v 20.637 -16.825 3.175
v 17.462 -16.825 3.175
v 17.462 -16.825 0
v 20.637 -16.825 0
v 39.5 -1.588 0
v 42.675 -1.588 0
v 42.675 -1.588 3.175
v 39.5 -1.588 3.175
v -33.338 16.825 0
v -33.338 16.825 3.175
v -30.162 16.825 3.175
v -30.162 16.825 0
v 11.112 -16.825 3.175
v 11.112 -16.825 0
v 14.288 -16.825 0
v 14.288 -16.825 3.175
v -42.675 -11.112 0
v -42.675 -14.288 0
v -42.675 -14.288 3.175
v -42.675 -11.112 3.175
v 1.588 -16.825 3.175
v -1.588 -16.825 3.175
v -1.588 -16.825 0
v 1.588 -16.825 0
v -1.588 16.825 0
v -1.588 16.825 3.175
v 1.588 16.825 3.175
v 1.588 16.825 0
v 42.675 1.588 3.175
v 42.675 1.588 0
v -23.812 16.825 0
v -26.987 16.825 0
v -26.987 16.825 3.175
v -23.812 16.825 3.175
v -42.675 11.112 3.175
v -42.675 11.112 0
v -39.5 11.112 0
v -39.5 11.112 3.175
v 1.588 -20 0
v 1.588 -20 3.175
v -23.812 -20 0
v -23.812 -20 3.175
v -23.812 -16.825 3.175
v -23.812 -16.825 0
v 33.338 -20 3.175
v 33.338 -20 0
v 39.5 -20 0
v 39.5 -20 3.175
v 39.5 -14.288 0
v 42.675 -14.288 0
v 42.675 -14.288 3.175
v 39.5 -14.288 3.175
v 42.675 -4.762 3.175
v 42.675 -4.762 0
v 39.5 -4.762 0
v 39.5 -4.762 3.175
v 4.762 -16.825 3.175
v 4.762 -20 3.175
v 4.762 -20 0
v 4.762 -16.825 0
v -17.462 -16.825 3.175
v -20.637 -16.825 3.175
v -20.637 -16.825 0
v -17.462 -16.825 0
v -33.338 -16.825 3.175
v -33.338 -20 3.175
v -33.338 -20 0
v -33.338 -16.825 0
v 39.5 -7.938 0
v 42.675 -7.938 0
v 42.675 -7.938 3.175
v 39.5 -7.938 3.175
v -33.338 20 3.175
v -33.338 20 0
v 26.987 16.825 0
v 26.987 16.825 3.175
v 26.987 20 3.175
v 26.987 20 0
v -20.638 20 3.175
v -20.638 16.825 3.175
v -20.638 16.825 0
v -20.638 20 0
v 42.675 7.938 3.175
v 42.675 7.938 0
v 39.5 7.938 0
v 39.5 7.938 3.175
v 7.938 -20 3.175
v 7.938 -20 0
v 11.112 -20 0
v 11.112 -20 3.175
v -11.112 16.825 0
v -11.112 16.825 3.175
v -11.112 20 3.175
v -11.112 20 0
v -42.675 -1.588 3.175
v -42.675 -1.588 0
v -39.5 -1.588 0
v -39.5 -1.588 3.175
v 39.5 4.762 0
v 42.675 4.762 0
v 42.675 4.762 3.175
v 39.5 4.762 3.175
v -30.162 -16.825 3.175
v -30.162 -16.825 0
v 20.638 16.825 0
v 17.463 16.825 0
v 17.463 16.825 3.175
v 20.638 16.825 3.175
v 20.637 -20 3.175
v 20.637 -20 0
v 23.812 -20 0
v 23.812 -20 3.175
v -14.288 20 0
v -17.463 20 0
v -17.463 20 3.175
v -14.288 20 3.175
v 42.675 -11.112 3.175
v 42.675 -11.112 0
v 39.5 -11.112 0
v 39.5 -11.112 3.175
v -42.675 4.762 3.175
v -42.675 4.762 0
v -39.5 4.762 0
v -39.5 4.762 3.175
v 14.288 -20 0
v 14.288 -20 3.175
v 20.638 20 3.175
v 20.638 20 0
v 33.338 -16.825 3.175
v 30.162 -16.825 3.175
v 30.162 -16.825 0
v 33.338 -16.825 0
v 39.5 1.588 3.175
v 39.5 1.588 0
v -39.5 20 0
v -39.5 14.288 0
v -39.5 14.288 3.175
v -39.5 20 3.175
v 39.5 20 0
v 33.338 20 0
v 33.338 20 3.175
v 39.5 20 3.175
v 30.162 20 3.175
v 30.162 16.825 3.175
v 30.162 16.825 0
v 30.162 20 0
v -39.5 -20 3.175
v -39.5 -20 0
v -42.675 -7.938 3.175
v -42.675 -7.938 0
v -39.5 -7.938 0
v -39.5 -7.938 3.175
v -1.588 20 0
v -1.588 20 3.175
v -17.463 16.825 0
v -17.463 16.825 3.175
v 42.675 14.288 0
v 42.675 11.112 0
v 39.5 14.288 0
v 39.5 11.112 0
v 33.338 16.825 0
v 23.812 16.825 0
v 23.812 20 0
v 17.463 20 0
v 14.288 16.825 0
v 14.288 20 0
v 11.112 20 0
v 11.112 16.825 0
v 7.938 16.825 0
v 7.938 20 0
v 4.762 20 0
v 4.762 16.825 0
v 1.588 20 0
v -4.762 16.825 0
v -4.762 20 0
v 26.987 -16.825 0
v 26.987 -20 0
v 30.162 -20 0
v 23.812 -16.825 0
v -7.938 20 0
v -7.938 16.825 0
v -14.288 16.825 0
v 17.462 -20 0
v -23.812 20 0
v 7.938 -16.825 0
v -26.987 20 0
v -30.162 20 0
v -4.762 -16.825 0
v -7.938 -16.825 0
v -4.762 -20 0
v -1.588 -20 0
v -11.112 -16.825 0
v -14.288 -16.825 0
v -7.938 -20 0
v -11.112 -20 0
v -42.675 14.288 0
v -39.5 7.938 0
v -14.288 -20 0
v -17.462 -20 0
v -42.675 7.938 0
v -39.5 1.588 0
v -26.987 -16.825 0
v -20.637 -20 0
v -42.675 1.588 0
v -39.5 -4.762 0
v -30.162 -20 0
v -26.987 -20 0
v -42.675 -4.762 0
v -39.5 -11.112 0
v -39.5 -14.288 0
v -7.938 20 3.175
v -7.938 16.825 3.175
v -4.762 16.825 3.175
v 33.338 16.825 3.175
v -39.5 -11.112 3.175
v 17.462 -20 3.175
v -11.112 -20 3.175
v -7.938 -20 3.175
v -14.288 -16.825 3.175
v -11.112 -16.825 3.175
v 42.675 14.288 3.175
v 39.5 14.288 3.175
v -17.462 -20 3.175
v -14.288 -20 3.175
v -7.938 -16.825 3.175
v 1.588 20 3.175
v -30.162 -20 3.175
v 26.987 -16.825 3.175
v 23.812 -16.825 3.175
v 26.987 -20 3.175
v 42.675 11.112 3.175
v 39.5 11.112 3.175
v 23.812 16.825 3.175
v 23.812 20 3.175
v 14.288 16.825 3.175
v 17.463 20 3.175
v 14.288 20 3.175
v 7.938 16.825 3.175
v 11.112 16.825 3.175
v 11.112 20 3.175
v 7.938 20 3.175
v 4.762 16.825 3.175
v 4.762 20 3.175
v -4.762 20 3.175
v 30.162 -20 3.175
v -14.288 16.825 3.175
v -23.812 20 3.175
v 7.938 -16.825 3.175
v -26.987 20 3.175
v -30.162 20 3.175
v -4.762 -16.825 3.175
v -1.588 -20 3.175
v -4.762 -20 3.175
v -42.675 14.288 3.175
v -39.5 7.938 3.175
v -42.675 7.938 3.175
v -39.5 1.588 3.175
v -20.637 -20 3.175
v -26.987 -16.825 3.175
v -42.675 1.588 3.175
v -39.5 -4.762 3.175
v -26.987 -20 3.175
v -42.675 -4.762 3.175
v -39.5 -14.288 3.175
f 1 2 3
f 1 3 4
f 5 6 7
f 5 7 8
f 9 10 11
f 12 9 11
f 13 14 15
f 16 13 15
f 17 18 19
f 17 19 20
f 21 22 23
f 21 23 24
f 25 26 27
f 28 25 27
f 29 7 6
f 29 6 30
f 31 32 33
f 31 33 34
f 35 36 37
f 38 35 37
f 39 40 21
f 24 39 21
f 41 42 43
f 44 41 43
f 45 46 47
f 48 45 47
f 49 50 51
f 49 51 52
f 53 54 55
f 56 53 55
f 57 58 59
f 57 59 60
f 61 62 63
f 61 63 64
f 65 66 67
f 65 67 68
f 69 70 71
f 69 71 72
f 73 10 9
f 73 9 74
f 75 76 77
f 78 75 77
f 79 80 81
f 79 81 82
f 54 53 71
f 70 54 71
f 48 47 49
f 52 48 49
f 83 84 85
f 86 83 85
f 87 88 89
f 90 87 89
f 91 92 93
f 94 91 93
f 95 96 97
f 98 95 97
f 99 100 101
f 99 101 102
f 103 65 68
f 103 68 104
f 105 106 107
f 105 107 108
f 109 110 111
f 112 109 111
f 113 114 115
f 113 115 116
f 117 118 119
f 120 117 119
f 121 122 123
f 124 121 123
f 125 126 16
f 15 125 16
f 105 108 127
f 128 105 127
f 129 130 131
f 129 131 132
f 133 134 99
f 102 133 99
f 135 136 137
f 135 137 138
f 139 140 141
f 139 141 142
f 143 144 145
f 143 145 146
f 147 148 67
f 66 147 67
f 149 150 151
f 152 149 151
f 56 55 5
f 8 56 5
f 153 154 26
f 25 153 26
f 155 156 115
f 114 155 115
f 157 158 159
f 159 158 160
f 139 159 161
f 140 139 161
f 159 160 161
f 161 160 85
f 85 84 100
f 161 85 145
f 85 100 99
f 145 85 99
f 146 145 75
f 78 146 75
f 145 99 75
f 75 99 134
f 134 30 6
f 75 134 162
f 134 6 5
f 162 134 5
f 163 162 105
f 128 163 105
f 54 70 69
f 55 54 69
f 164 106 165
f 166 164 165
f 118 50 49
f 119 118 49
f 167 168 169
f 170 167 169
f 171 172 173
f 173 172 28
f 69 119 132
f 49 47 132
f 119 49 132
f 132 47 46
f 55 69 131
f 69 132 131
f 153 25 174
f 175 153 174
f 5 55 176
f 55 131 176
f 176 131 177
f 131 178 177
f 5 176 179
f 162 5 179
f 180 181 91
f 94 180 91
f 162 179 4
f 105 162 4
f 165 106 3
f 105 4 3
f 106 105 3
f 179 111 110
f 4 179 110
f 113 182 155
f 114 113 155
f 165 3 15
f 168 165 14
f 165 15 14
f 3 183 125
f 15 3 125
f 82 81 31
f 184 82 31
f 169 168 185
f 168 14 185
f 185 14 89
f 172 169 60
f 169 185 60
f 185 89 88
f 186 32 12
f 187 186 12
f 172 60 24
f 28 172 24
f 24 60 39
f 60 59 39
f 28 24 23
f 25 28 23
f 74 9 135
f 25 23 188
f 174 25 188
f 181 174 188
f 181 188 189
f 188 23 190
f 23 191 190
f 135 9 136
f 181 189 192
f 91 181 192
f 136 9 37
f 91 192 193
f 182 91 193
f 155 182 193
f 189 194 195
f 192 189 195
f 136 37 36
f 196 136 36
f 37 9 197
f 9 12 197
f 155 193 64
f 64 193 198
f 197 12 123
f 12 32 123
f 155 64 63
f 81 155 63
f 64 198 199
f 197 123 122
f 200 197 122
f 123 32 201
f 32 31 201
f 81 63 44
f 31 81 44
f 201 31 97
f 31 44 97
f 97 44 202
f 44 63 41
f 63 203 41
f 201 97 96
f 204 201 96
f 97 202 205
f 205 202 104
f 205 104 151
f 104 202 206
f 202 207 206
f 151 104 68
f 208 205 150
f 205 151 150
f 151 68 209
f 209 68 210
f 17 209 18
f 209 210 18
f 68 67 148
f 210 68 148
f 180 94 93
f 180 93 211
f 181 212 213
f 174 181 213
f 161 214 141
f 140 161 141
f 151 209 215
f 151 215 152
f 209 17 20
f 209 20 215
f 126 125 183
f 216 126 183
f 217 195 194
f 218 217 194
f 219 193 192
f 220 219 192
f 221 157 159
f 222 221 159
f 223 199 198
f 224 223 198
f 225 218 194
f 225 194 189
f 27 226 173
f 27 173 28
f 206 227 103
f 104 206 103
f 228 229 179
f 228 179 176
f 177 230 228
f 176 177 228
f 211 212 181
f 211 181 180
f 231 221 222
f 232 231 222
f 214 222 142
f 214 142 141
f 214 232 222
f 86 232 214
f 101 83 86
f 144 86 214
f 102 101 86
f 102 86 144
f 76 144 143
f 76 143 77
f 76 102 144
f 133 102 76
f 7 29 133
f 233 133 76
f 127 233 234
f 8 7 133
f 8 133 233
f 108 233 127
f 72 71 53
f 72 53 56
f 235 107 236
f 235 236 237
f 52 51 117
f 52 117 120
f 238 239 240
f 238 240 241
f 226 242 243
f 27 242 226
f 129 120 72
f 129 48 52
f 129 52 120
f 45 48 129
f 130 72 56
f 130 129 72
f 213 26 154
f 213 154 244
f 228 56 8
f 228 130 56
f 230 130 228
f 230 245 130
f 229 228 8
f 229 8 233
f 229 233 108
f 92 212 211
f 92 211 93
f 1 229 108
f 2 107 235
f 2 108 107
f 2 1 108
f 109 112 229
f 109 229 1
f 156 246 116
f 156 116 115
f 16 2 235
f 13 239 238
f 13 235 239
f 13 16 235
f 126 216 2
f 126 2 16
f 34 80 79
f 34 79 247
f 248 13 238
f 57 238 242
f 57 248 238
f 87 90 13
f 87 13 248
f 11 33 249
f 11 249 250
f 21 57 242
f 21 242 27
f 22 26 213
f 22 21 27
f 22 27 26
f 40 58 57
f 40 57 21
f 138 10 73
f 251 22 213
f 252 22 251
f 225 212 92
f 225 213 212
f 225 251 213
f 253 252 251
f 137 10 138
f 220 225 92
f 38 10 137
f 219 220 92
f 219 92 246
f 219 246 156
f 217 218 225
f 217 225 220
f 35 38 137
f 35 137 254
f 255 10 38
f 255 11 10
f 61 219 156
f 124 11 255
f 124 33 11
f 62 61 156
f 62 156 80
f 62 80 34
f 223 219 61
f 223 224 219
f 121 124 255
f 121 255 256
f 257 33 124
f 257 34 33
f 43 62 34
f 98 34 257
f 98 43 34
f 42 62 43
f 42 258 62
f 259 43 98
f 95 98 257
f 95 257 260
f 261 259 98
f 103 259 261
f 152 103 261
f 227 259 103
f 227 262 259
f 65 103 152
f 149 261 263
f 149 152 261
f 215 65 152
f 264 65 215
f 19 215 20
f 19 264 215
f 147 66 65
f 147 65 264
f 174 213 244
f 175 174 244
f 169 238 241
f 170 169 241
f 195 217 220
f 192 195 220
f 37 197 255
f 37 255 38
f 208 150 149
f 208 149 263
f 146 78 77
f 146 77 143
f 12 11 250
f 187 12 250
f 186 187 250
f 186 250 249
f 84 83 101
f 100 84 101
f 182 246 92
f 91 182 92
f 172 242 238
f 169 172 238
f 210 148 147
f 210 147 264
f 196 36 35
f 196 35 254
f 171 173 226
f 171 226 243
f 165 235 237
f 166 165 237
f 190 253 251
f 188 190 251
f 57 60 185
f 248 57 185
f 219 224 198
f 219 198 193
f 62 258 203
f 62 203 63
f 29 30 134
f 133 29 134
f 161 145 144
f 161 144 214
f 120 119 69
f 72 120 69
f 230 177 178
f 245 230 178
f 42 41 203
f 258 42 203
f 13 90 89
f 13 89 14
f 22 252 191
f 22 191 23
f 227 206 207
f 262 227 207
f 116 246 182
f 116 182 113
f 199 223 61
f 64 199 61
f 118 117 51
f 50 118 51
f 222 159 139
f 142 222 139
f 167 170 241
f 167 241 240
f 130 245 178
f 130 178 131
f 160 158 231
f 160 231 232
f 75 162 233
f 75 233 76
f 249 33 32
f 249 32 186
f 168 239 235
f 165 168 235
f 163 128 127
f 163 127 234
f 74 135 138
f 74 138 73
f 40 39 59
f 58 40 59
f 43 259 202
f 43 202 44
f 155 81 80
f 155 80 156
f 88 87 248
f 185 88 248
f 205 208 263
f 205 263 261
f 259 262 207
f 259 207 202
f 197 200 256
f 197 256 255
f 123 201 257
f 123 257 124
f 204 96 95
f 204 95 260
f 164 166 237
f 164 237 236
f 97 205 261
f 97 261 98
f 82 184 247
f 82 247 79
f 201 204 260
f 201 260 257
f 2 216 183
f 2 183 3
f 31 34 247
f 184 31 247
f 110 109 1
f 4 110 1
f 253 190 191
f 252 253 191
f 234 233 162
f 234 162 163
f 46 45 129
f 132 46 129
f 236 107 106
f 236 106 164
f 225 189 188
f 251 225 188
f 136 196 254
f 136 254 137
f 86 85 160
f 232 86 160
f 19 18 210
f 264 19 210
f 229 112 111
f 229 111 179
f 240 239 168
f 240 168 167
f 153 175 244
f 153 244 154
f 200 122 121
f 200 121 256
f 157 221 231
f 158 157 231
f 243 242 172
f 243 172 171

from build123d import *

# Parameters (mm, degrees)
SKETCH1_W                     = 79
SKETCH1_H                     = 40
BOSS_EXTRUDE1_DEPTH           = 3.175
SKETCH2_W                     = 3.175
SKETCH2_H                     = 6.35
CUT_EXTRUDE1_DEPTH            = 10
LPATTERN1_COUNT               = 6
LPATTERN1_PITCH               = 6.35
LPATTERN1_COPY_1_SKETCH_W     = 3.175
LPATTERN1_COPY_1_SKETCH_H     = 6.35
LPATTERN1_COPY_1_DEPTH        = 10
LPATTERN1_COPY_2_SKETCH_W     = 3.175
LPATTERN1_COPY_2_SKETCH_H     = 6.35
LPATTERN1_COPY_2_DEPTH        = 10
LPATTERN1_COPY_3_SKETCH_W     = 3.175
LPATTERN1_COPY_3_SKETCH_H     = 6.35
LPATTERN1_COPY_3_DEPTH        = 10
LPATTERN1_COPY_4_SKETCH_W     = 3.175
LPATTERN1_COPY_4_SKETCH_H     = 6.35
LPATTERN1_COPY_4_DEPTH        = 10
LPATTERN1_COPY_5_SKETCH_W     = 3.175
LPATTERN1_COPY_5_SKETCH_H     = 6.35
LPATTERN1_COPY_5_DEPTH        = 10
LPATTERN1_COL_COUNT           = 6
LPATTERN1_COL_PITCH           = 6.35
LPATTERN1_COL_COPY_1_SKETCH_W = 3.175
LPATTERN1_COL_COPY_1_SKETCH_H = 6.35
LPATTERN1_COL_COPY_1_DEPTH    = 10
LPATTERN1_COL_COPY_2_SKETCH_W = 3.175
LPATTERN1_COL_COPY_2_SKETCH_H = 6.35
LPATTERN1_COL_COPY_2_DEPTH    = 10
LPATTERN1_COL_COPY_3_SKETCH_W = 3.175
LPATTERN1_COL_COPY_3_SKETCH_H = 6.35
LPATTERN1_COL_COPY_3_DEPTH    = 10
LPATTERN1_COL_COPY_4_SKETCH_W = 3.175
LPATTERN1_COL_COPY_4_SKETCH_H = 6.35
LPATTERN1_COL_COPY_4_DEPTH    = 10
LPATTERN1_COL_COPY_5_SKETCH_W = 3.175
LPATTERN1_COL_COPY_5_SKETCH_H = 6.35
LPATTERN1_COL_COPY_5_DEPTH    = 10
SKETCH3_W                     = 6.35
SKETCH3_H                     = 3.175
BOSS_EXTRUDE2_DEPTH           = 3.175
LPATTERN2_COUNT               = 3
LPATTERN2_PITCH               = 6.35
LPATTERN2_COL_COUNT           = 3
LPATTERN2_COL_PITCH           = 6.35
MIRROR2_COPY_1_SKETCH_W       = 6.35
MIRROR2_COPY_1_SKETCH_H       = 3.175
MIRROR2_COPY_1_DEPTH          = 3.175
MIRROR2_COPY_2_SKETCH_W       = 6.35
MIRROR2_COPY_2_SKETCH_H       = 3.175
MIRROR2_COPY_2_DEPTH          = 3.175
MIRROR2_COPY_3_SKETCH_W       = 6.35
MIRROR2_COPY_3_SKETCH_H       = 3.175
MIRROR2_COPY_3_DEPTH          = 3.175
MIRROR2_COPY_4_SKETCH_W       = 6.35
MIRROR2_COPY_4_SKETCH_H       = 3.175
MIRROR2_COPY_4_DEPTH          = 3.175


with BuildPart() as part:
    # Sketch1 → Boss-Extrude1 (new body)
    with BuildSketch(Plane.XY):
        Rectangle(SKETCH1_W, SKETCH1_H)
    extrude(amount=BOSS_EXTRUDE1_DEPTH)

    # Sketch2 → Cut-Extrude1 (cut)
    with BuildSketch(Plane.XY.offset(3.175)):
        with Locations((0, -20)):
            Rectangle(SKETCH2_W, SKETCH2_H)
    cut_extrude1 = extrude(amount=-CUT_EXTRUDE1_DEPTH, mode=Mode.SUBTRACT)

    # Mirror1: Cut-Extrude1 across plane
    add(cut_extrude1.mirror(Plane.ZX), mode=Mode.SUBTRACT)

    # LPattern1: Cut-Extrude1 ×6
    with Locations(*[(i * LPATTERN1_PITCH, 0, 0) for i in range(1, LPATTERN1_COUNT)]):
        add(cut_extrude1, mode=Mode.SUBTRACT)

    # LPattern1 copy 1 sketch → LPattern1 copy 1 (cut)
    with BuildSketch(Plane(origin=(6.35, 0, 3.175), x_dir=(1, 0, 0), z_dir=(0, 0, 1))):
        with Locations((0, 20)):
            Rectangle(LPATTERN1_COPY_1_SKETCH_W, LPATTERN1_COPY_1_SKETCH_H)
    extrude(amount=-LPATTERN1_COPY_1_DEPTH, mode=Mode.SUBTRACT)

    # LPattern1 copy 2 sketch → LPattern1 copy 2 (cut)
    with BuildSketch(Plane(origin=(12.7, 0, 3.175), x_dir=(1, 0, 0), z_dir=(0, 0, 1))):
        with Locations((0, 20)):
            Rectangle(LPATTERN1_COPY_2_SKETCH_W, LPATTERN1_COPY_2_SKETCH_H)
    extrude(amount=-LPATTERN1_COPY_2_DEPTH, mode=Mode.SUBTRACT)

    # LPattern1 copy 3 sketch → LPattern1 copy 3 (cut)
    with BuildSketch(Plane(origin=(19.05, 0, 3.175), x_dir=(1, 0, 0), z_dir=(0, 0, 1))):
        with Locations((0, 20)):
            Rectangle(LPATTERN1_COPY_3_SKETCH_W, LPATTERN1_COPY_3_SKETCH_H)
    extrude(amount=-LPATTERN1_COPY_3_DEPTH, mode=Mode.SUBTRACT)

    # LPattern1 copy 4 sketch → LPattern1 copy 4 (cut)
    with BuildSketch(Plane(origin=(25.4, 0, 3.175), x_dir=(1, 0, 0), z_dir=(0, 0, 1))):
        with Locations((0, 20)):
            Rectangle(LPATTERN1_COPY_4_SKETCH_W, LPATTERN1_COPY_4_SKETCH_H)
    extrude(amount=-LPATTERN1_COPY_4_DEPTH, mode=Mode.SUBTRACT)

    # LPattern1 copy 5 sketch → LPattern1 copy 5 (cut)
    with BuildSketch(Plane(origin=(31.75, 0, 3.175), x_dir=(1, 0, 0), z_dir=(0, 0, 1))):
        with Locations((0, 20)):
            Rectangle(LPATTERN1_COPY_5_SKETCH_W, LPATTERN1_COPY_5_SKETCH_H)
    extrude(amount=-LPATTERN1_COPY_5_DEPTH, mode=Mode.SUBTRACT)

    # LPattern1 col: Cut-Extrude1 ×6
    with Locations(*[(-i * LPATTERN1_COL_PITCH, 0, 0) for i in range(1, LPATTERN1_COL_COUNT)]):
        add(cut_extrude1, mode=Mode.SUBTRACT)

    # LPattern1 col copy 1 sketch → LPattern1 col copy 1 (cut)
    with BuildSketch(Plane(origin=(-6.35, 0, 3.175), x_dir=(1, 0, 0), z_dir=(0, 0, 1))):
        with Locations((0, 20)):
            Rectangle(LPATTERN1_COL_COPY_1_SKETCH_W, LPATTERN1_COL_COPY_1_SKETCH_H)
    extrude(amount=-LPATTERN1_COL_COPY_1_DEPTH, mode=Mode.SUBTRACT)

    # LPattern1 col copy 2 sketch → LPattern1 col copy 2 (cut)
    with BuildSketch(Plane(origin=(-12.7, 0, 3.175), x_dir=(1, 0, 0), z_dir=(0, 0, 1))):
        with Locations((0, 20)):
            Rectangle(LPATTERN1_COL_COPY_2_SKETCH_W, LPATTERN1_COL_COPY_2_SKETCH_H)
    extrude(amount=-LPATTERN1_COL_COPY_2_DEPTH, mode=Mode.SUBTRACT)

    # LPattern1 col copy 3 sketch → LPattern1 col copy 3 (cut)
    with BuildSketch(Plane(origin=(-19.05, 0, 3.175), x_dir=(1, 0, 0), z_dir=(0, 0, 1))):
        with Locations((0, 20)):
            Rectangle(LPATTERN1_COL_COPY_3_SKETCH_W, LPATTERN1_COL_COPY_3_SKETCH_H)
    extrude(amount=-LPATTERN1_COL_COPY_3_DEPTH, mode=Mode.SUBTRACT)

    # LPattern1 col copy 4 sketch → LPattern1 col copy 4 (cut)
    with BuildSketch(Plane(origin=(-25.4, 0, 3.175), x_dir=(1, 0, 0), z_dir=(0, 0, 1))):
        with Locations((0, 20)):
            Rectangle(LPATTERN1_COL_COPY_4_SKETCH_W, LPATTERN1_COL_COPY_4_SKETCH_H)
    extrude(amount=-LPATTERN1_COL_COPY_4_DEPTH, mode=Mode.SUBTRACT)

    # LPattern1 col copy 5 sketch → LPattern1 col copy 5 (cut)
    with BuildSketch(Plane(origin=(-31.75, 0, 3.175), x_dir=(1, 0, 0), z_dir=(0, 0, 1))):
        with Locations((0, 20)):
            Rectangle(LPATTERN1_COL_COPY_5_SKETCH_W, LPATTERN1_COL_COPY_5_SKETCH_H)
    extrude(amount=-LPATTERN1_COL_COPY_5_DEPTH, mode=Mode.SUBTRACT)

    # Sketch3 → Boss-Extrude2 (add)
    with BuildSketch(Plane.XY.offset(3.175)):
        with Locations((-39.5, 0)):
            Rectangle(SKETCH3_W, SKETCH3_H)
    boss_extrude2 = extrude(amount=-BOSS_EXTRUDE2_DEPTH)

    # LPattern2: Boss-Extrude2 ×3
    with Locations(*[(0, i * LPATTERN2_PITCH, 0) for i in range(1, LPATTERN2_COUNT)]):
        add(boss_extrude2)

    # LPattern2 col: Boss-Extrude2 ×3
    with Locations(*[(0, -i * LPATTERN2_COL_PITCH, 0) for i in range(1, LPATTERN2_COL_COUNT)]):
        add(boss_extrude2)

    # Mirror2: Boss-Extrude2 across plane
    add(boss_extrude2.mirror(Plane(origin=(0, 0, 0), x_dir=(0, 0, 1), z_dir=(1, 0, 0))))

    # Mirror2 copy 1 sketch → Mirror2 copy 1 (add)
    with BuildSketch(Plane(origin=(0, 6.35, 3.175), x_dir=(-1, 0, 0), z_dir=(0, 0, 1))):
        with Locations((-39.5, 0)):
            Rectangle(MIRROR2_COPY_1_SKETCH_W, MIRROR2_COPY_1_SKETCH_H)
    extrude(amount=-MIRROR2_COPY_1_DEPTH)

    # Mirror2 copy 2 sketch → Mirror2 copy 2 (add)
    with BuildSketch(Plane(origin=(0, 12.7, 3.175), x_dir=(-1, 0, 0), z_dir=(0, 0, 1))):
        with Locations((-39.5, 0)):
            Rectangle(MIRROR2_COPY_2_SKETCH_W, MIRROR2_COPY_2_SKETCH_H)
    extrude(amount=-MIRROR2_COPY_2_DEPTH)

    # Mirror2 copy 3 sketch → Mirror2 copy 3 (add)
    with BuildSketch(Plane(origin=(0, -6.35, 3.175), x_dir=(-1, 0, 0), z_dir=(0, 0, 1))):
        with Locations((-39.5, 0)):
            Rectangle(MIRROR2_COPY_3_SKETCH_W, MIRROR2_COPY_3_SKETCH_H)
    extrude(amount=-MIRROR2_COPY_3_DEPTH)

    # Mirror2 copy 4 sketch → Mirror2 copy 4 (add)
    with BuildSketch(Plane(origin=(0, -12.7, 3.175), x_dir=(-1, 0, 0), z_dir=(0, 0, 1))):
        with Locations((-39.5, 0)):
            Rectangle(MIRROR2_COPY_4_SKETCH_W, MIRROR2_COPY_4_SKETCH_H)
    extrude(amount=-MIRROR2_COPY_4_DEPTH)


solid = part.part
